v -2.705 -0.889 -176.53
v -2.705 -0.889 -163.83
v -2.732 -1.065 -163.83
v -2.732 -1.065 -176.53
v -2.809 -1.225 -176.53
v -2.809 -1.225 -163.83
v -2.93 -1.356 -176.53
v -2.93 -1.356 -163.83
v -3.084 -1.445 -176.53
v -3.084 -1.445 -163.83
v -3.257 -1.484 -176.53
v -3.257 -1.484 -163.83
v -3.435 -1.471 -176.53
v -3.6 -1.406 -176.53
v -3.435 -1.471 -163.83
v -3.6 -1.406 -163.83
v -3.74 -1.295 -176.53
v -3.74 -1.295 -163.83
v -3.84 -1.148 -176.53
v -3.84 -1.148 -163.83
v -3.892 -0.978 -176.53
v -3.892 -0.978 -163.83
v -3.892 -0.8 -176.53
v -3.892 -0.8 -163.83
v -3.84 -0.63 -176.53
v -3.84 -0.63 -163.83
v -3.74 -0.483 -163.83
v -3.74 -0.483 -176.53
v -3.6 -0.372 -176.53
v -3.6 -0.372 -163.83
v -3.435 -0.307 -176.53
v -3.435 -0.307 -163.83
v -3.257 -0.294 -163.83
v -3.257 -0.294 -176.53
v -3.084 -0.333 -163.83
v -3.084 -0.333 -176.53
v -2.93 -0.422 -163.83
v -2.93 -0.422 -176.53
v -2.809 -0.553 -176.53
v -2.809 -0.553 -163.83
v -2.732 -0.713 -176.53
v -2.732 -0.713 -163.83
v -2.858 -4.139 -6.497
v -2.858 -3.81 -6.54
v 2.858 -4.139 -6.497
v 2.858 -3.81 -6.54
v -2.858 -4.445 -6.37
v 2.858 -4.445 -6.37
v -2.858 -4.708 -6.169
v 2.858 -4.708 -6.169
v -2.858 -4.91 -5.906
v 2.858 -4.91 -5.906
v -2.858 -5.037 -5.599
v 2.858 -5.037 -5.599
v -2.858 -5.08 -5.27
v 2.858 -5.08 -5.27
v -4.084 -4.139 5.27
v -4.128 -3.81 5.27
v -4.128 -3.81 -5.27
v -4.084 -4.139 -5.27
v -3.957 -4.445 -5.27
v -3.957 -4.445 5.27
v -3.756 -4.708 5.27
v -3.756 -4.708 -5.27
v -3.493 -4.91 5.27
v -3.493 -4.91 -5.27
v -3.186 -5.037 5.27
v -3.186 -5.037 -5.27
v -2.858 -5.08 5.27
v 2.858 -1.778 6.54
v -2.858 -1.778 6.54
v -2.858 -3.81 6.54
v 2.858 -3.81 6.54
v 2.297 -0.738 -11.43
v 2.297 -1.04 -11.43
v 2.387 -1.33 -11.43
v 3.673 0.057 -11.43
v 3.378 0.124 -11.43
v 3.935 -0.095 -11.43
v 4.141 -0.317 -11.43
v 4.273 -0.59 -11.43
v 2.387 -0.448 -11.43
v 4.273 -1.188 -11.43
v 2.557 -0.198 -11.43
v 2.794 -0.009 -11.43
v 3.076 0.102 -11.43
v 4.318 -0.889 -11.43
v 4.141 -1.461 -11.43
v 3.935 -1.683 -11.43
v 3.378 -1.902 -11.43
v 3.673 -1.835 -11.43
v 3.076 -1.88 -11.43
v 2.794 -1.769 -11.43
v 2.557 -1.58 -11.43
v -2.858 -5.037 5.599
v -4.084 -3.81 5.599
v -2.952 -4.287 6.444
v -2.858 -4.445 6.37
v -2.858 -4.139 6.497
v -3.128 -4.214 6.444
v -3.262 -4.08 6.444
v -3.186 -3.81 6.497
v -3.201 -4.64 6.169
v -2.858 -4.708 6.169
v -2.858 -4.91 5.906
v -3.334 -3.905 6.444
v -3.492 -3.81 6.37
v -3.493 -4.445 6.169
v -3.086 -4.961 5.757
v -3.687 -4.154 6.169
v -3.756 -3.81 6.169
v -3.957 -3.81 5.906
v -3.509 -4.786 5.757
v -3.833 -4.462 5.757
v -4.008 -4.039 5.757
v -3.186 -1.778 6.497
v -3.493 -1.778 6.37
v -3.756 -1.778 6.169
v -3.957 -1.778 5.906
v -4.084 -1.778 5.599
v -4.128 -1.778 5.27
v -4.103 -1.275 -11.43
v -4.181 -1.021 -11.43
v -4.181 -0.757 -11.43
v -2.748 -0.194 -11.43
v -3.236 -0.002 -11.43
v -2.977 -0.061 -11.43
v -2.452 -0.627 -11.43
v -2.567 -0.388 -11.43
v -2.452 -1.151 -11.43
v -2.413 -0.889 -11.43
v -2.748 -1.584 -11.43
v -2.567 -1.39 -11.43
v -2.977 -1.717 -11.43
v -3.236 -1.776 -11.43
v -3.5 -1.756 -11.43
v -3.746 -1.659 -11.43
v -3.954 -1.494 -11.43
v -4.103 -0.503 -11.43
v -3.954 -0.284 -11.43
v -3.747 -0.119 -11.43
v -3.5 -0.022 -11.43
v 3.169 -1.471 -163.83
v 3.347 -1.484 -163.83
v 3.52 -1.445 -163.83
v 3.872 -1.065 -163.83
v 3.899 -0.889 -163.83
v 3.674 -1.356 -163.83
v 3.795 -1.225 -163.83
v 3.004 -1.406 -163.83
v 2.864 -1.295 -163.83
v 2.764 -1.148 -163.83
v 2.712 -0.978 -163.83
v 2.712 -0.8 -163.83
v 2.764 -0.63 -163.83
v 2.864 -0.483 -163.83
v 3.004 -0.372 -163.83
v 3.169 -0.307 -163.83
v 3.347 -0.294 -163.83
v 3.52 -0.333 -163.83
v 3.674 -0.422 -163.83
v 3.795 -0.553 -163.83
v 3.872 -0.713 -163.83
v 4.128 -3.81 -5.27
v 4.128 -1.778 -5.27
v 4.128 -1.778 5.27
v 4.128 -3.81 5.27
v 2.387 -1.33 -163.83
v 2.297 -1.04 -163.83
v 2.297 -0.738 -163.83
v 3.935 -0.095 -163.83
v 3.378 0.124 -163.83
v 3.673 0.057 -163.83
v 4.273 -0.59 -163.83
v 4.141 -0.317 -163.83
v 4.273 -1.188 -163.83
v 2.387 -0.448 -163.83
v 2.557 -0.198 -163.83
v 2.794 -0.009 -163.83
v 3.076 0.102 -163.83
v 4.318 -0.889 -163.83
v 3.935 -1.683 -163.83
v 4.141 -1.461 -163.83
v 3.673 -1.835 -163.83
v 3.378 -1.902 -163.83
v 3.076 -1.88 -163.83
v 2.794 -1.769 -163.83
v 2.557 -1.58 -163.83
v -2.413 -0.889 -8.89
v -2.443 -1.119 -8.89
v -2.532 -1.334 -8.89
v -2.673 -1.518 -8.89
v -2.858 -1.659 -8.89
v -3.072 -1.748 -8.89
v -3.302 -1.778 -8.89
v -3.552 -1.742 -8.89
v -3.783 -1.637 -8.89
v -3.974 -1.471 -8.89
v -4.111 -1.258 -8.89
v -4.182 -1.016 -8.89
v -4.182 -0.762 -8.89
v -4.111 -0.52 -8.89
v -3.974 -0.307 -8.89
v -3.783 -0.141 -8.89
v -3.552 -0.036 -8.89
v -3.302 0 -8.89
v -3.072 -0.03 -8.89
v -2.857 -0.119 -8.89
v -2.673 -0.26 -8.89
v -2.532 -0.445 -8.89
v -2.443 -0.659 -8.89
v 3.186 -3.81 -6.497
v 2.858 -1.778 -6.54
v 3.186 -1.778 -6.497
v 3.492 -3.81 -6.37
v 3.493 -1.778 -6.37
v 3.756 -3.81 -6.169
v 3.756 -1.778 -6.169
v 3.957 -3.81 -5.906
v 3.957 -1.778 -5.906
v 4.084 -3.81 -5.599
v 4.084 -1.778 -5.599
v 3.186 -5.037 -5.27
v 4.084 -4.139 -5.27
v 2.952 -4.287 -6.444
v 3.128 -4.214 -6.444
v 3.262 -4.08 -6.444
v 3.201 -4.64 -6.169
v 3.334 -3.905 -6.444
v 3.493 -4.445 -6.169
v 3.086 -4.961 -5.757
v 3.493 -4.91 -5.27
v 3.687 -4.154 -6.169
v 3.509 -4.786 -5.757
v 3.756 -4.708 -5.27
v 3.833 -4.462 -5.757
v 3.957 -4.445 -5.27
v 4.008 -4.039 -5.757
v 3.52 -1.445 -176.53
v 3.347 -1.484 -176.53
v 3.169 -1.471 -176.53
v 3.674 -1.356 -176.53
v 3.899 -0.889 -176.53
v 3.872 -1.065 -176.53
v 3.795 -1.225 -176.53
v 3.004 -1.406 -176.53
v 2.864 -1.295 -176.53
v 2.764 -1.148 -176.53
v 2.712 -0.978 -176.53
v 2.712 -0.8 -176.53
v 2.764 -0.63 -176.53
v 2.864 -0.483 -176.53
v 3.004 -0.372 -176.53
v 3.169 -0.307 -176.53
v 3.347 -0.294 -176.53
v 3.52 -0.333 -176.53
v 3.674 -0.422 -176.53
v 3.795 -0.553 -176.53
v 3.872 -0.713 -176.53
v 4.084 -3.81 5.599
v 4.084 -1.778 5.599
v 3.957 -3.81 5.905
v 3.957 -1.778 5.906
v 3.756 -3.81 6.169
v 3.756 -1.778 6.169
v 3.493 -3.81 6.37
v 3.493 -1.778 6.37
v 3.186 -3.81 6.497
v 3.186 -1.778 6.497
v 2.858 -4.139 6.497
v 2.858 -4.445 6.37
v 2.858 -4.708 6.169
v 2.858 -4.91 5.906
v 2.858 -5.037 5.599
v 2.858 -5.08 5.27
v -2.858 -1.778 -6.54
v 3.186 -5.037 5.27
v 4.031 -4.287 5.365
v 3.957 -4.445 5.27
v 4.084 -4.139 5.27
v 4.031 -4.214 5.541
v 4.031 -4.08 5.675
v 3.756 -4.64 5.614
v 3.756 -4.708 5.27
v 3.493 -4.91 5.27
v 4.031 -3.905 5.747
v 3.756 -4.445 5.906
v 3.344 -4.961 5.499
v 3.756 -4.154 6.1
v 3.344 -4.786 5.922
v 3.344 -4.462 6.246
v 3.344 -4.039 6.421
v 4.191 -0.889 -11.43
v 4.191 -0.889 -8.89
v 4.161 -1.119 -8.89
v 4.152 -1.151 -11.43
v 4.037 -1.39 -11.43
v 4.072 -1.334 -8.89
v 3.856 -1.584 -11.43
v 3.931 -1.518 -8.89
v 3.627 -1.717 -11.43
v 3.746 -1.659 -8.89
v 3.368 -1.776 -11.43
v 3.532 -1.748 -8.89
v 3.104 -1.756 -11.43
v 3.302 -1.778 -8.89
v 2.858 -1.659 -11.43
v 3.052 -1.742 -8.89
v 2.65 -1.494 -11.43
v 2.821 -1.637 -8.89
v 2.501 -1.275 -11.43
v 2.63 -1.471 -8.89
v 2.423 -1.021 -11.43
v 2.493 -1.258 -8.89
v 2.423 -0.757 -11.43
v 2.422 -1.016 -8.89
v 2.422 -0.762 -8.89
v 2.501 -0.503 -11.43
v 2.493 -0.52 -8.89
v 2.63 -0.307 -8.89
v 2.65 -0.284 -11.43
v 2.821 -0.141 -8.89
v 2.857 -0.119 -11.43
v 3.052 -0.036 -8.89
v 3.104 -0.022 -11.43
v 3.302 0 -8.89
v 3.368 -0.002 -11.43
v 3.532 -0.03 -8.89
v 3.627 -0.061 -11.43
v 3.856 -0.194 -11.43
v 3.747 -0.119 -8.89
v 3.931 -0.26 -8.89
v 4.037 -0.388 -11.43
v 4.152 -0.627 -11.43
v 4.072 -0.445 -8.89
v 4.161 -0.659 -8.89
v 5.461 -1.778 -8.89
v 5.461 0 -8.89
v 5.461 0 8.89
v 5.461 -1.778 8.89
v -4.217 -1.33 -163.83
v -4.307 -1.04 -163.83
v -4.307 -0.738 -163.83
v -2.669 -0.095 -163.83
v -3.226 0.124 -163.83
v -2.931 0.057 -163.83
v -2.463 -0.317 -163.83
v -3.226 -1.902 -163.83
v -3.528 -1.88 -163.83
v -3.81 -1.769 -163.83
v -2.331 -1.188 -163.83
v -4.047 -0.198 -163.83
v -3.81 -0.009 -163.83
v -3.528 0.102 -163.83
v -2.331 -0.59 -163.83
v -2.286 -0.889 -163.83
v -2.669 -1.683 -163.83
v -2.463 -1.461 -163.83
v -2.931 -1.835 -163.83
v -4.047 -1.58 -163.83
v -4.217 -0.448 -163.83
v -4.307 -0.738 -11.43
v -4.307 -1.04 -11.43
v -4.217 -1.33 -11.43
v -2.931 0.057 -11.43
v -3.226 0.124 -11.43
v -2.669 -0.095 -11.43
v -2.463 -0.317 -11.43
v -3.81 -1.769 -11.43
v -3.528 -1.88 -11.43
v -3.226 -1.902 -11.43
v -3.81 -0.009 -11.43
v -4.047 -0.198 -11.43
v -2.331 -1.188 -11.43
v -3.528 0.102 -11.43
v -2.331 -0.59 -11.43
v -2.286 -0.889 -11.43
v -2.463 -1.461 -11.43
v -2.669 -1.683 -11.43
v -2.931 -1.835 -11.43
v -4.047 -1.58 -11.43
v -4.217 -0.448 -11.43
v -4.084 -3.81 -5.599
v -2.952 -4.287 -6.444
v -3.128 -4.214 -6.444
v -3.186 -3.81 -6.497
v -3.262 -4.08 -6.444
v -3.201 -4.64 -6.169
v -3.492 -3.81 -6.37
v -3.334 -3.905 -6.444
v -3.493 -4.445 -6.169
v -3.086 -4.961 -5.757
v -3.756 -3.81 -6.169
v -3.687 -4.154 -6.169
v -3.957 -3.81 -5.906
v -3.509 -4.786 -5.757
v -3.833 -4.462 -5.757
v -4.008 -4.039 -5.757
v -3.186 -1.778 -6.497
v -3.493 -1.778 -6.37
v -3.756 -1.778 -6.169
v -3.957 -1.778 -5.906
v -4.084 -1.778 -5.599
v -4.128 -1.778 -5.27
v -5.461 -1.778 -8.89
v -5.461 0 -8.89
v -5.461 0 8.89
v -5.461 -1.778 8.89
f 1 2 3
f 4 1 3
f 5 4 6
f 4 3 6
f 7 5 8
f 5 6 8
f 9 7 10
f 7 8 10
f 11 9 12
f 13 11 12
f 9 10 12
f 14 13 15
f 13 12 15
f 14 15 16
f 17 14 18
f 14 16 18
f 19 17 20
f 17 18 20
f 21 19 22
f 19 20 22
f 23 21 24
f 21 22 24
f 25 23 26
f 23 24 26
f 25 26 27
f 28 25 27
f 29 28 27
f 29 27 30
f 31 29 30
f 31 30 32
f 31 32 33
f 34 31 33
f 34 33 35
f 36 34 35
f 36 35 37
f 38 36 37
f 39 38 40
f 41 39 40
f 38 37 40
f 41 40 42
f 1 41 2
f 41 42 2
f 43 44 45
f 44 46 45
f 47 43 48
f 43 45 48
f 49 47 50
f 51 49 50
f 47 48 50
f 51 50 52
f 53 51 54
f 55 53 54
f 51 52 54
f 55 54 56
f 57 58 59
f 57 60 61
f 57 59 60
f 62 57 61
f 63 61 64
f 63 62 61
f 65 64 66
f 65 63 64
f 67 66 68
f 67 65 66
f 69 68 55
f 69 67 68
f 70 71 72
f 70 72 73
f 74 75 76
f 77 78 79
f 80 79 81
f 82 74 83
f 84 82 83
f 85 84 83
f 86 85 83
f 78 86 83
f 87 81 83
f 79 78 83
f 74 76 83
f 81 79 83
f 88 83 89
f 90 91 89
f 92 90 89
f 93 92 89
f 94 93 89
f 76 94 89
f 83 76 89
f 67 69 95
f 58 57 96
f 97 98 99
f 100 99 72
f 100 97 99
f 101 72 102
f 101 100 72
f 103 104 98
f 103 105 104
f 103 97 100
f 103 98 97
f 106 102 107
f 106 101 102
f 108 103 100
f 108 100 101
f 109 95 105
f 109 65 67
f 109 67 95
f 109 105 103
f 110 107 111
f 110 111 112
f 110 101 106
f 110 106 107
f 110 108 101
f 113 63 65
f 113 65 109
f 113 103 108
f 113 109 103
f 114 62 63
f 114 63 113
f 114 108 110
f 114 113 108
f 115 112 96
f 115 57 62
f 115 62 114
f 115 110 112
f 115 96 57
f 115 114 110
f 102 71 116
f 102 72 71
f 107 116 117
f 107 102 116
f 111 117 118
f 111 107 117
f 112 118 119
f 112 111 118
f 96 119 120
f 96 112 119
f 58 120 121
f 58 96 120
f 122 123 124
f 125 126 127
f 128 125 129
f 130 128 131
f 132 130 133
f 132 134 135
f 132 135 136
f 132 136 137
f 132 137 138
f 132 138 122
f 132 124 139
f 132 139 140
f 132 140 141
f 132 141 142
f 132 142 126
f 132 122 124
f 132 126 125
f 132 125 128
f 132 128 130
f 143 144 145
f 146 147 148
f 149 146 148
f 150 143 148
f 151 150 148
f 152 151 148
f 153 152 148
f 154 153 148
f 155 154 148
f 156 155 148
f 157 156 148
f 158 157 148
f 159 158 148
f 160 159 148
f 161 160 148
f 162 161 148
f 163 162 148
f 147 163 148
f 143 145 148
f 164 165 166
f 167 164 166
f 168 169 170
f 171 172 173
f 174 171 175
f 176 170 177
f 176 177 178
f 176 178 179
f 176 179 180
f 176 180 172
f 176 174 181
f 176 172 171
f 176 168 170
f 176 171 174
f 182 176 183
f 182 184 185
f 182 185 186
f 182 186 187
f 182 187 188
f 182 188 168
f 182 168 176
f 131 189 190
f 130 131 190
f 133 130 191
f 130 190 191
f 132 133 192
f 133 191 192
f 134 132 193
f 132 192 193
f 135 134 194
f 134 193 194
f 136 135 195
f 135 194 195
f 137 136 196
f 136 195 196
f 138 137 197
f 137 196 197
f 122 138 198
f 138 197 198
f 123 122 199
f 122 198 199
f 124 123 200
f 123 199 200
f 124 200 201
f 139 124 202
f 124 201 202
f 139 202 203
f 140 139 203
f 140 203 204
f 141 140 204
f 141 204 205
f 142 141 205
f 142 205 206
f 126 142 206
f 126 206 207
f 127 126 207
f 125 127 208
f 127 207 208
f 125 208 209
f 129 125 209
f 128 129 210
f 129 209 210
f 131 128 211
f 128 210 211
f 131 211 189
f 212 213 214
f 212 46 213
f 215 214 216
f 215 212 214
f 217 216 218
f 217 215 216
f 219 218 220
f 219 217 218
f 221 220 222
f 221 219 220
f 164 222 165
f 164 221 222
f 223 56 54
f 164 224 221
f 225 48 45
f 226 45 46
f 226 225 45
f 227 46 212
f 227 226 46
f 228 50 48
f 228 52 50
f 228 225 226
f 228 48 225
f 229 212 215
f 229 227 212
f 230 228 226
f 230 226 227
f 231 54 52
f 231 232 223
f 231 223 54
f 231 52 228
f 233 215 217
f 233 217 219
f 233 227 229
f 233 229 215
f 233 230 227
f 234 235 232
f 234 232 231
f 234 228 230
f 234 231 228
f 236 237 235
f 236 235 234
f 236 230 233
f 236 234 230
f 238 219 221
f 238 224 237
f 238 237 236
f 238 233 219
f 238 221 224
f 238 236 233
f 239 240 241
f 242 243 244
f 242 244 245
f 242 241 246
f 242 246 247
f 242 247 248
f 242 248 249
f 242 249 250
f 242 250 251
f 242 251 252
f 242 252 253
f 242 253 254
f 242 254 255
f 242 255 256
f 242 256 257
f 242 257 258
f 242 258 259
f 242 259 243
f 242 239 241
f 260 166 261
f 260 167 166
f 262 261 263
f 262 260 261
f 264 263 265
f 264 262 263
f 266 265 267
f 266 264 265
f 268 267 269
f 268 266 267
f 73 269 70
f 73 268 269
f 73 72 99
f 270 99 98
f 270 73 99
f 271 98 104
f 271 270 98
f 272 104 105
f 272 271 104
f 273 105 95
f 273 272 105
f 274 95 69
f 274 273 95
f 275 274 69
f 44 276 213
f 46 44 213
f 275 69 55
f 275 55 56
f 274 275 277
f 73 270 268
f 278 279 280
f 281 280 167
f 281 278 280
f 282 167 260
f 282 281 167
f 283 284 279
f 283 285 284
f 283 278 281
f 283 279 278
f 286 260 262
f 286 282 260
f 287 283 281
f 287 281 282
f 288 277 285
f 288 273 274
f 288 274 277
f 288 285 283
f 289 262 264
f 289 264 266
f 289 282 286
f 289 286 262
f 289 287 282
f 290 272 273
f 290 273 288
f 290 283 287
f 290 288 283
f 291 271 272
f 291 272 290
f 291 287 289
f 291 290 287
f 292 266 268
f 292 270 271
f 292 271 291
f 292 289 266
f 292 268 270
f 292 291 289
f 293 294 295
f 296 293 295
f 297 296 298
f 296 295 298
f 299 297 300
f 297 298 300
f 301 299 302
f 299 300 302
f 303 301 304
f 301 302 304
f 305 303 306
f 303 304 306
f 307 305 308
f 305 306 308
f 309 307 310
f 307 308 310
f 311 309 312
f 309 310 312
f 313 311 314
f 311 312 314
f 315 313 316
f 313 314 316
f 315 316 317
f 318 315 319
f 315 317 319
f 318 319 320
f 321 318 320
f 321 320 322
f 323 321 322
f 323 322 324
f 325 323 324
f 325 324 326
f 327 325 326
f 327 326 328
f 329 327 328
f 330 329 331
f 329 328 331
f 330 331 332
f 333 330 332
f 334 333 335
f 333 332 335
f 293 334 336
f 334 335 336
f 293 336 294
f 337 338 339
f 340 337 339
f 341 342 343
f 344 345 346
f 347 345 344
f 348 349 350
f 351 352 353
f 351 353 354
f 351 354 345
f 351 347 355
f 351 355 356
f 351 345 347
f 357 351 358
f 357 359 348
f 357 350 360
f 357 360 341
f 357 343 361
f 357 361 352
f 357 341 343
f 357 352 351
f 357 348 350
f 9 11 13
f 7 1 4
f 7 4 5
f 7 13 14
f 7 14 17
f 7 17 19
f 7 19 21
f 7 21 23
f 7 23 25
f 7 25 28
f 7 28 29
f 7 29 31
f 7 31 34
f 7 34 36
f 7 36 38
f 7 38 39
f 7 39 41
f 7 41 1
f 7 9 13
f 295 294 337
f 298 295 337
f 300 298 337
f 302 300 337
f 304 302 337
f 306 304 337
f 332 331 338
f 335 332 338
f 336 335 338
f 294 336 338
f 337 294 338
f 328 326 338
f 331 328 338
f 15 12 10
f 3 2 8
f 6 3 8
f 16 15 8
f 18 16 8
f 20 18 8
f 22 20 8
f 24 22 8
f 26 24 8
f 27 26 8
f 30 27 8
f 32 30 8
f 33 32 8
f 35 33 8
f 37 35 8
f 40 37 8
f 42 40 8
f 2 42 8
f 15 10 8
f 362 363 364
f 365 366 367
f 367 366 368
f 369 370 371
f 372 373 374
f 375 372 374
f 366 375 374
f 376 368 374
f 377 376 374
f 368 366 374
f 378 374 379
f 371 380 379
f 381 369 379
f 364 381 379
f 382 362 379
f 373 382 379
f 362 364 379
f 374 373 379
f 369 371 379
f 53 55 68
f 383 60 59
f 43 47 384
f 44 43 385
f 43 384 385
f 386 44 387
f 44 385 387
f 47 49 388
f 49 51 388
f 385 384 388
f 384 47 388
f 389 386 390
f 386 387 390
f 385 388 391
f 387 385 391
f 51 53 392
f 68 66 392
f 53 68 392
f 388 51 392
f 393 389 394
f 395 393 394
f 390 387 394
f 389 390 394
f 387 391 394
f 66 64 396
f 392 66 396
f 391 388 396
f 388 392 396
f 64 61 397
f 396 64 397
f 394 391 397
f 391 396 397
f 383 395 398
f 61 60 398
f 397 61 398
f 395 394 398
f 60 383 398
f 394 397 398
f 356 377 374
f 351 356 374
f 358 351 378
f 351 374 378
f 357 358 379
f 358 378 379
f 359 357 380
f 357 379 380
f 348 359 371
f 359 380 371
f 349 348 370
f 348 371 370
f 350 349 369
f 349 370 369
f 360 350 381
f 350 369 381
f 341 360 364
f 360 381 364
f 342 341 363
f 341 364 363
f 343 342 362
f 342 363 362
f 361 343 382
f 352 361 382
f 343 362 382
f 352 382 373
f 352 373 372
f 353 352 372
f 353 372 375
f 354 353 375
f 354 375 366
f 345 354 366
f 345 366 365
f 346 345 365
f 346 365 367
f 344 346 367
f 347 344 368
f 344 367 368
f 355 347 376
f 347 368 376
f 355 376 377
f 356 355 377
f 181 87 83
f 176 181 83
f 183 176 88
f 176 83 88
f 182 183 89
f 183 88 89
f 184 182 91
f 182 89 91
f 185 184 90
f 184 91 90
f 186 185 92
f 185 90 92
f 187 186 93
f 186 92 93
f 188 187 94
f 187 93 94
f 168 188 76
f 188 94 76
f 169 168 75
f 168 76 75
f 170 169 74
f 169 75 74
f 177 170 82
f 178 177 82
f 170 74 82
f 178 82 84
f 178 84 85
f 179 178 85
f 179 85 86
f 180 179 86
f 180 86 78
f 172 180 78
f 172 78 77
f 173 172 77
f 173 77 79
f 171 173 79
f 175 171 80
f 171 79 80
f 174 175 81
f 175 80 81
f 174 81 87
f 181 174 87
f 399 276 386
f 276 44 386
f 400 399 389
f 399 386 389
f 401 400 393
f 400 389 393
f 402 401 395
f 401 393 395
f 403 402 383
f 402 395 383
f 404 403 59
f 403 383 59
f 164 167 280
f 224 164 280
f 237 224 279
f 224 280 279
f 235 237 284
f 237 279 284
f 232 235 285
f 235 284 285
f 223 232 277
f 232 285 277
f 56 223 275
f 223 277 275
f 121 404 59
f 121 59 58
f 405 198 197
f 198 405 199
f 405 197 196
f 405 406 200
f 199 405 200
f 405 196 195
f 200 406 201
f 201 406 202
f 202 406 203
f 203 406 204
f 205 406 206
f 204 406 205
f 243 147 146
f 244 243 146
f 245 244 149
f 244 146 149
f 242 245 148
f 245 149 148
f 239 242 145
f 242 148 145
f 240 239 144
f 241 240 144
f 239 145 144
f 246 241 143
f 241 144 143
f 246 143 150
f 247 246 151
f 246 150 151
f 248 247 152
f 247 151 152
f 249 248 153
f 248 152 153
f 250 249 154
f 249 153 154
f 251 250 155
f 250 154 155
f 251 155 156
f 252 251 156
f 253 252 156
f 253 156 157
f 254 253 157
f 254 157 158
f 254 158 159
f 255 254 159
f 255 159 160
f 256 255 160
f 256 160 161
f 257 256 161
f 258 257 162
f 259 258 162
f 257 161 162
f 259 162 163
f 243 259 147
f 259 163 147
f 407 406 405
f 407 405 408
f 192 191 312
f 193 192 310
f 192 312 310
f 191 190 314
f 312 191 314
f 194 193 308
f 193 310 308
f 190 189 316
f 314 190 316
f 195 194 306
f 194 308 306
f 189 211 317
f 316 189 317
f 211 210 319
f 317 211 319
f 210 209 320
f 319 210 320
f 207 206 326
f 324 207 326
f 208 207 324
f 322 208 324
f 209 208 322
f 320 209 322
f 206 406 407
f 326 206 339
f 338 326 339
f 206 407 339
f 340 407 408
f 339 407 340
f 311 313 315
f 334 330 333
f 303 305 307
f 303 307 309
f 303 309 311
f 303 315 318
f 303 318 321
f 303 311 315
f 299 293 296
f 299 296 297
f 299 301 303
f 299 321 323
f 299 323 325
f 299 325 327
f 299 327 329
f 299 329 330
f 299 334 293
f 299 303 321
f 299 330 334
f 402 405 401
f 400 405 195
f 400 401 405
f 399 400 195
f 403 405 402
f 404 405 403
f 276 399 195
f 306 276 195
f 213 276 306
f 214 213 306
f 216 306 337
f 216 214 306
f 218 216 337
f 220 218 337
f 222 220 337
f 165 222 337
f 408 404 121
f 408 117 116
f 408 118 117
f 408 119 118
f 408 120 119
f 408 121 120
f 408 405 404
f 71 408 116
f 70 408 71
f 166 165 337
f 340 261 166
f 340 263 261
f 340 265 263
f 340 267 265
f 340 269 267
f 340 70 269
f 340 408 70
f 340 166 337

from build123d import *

# Parameters (mm, degrees)
F0_W      = 10.922
F0_H      = 17.78
F1_DEPTH  = 1.778
F2_W      = 8.255
F2_H      = 13.081
F3_DEPTH  = 3.302
F4_R      = 1.27
F5_R      = 0.889
F6_DEPTH  = 2.54
F7_R      = 1.016
F8_DEPTH  = 152.4
F9_R      = 1.016
F10_DEPTH = 152.4
F11_R     = 0.5969
F12_DEPTH = 12.7
F13_R     = 0.5969
F14_DEPTH = 12.7


with BuildPart() as f1:
    # F0 (on Front) → F1 (new body)
    with BuildSketch(Plane.XZ):
        Rectangle(F0_W, F0_H)
    extrude(amount=F1_DEPTH)

    # F2 (on face) → F3 (join)
    with BuildSketch(Plane.XZ.offset(1.778)):
        Rectangle(F2_W, F2_H)
    extrude(amount=F3_DEPTH)

    # F4
    f4_edges = [f1.edges().sort_by_distance(p)[0] for p in [
        (-4.1275, -5.08, 0),
        (0, -5.08, 6.5405),
        (4.1275, -5.08, 0),
        (0, -5.08, -6.5405),
        (-4.1275, -3.429, -6.5405),
        (-4.1275, -3.429, 6.5405),
        (4.1275, -3.429, 6.5405),
        (4.1275, -3.429, -6.5405),
    ]]
    fillet(f4_edges, radius=F4_R)

    # F5 (on face) → F6 (join)
    with BuildSketch(Plane(origin=(0, 0, -8.89), x_dir=(1, 0, 0), z_dir=(0, 0, -1))):
        with Locations((-3.302, 0.889)):
            Circle(F5_R)
        with Locations((3.302, 0.889)):
            Circle(F5_R)
    extrude(amount=F6_DEPTH)


with BuildPart() as f8:
    # F7 (on face) → F8 (new body)
    with BuildSketch(Plane(origin=(0, 0, -11.43), x_dir=(1, 0, 0), z_dir=(0, 0, -1))):
        with Locations((-3.302, 0.889)):
            Circle(F7_R)
    extrude(amount=F8_DEPTH)


with BuildPart() as f10:
    # F9 (on face) → F10 (new body)
    with BuildSketch(Plane(origin=(0, 0, -11.43), x_dir=(1, 0, 0), z_dir=(0, 0, -1))):
        with Locations((3.302, 0.889)):
            Circle(F9_R)
    extrude(amount=F10_DEPTH)


with BuildPart() as f12:
    # F11 (on face) → F12 (new body)
    with BuildSketch(Plane(origin=(0, 0, -163.83), x_dir=(1, 0, 0), z_dir=(0, 0, -1))):
        with Locations((-3.302, 0.889)):
            Circle(F11_R)
    extrude(amount=F12_DEPTH)


with BuildPart() as f14:
    # F13 (on face) → F14 (new body)
    with BuildSketch(Plane(origin=(0, 0, -163.83), x_dir=(1, 0, 0), z_dir=(0, 0, -1))):
        with Locations((3.302, 0.889)):
            Circle(F13_R)
    extrude(amount=F14_DEPTH)


solid = Compound([f1.part, f8.part, f10.part, f12.part, f14.part])
